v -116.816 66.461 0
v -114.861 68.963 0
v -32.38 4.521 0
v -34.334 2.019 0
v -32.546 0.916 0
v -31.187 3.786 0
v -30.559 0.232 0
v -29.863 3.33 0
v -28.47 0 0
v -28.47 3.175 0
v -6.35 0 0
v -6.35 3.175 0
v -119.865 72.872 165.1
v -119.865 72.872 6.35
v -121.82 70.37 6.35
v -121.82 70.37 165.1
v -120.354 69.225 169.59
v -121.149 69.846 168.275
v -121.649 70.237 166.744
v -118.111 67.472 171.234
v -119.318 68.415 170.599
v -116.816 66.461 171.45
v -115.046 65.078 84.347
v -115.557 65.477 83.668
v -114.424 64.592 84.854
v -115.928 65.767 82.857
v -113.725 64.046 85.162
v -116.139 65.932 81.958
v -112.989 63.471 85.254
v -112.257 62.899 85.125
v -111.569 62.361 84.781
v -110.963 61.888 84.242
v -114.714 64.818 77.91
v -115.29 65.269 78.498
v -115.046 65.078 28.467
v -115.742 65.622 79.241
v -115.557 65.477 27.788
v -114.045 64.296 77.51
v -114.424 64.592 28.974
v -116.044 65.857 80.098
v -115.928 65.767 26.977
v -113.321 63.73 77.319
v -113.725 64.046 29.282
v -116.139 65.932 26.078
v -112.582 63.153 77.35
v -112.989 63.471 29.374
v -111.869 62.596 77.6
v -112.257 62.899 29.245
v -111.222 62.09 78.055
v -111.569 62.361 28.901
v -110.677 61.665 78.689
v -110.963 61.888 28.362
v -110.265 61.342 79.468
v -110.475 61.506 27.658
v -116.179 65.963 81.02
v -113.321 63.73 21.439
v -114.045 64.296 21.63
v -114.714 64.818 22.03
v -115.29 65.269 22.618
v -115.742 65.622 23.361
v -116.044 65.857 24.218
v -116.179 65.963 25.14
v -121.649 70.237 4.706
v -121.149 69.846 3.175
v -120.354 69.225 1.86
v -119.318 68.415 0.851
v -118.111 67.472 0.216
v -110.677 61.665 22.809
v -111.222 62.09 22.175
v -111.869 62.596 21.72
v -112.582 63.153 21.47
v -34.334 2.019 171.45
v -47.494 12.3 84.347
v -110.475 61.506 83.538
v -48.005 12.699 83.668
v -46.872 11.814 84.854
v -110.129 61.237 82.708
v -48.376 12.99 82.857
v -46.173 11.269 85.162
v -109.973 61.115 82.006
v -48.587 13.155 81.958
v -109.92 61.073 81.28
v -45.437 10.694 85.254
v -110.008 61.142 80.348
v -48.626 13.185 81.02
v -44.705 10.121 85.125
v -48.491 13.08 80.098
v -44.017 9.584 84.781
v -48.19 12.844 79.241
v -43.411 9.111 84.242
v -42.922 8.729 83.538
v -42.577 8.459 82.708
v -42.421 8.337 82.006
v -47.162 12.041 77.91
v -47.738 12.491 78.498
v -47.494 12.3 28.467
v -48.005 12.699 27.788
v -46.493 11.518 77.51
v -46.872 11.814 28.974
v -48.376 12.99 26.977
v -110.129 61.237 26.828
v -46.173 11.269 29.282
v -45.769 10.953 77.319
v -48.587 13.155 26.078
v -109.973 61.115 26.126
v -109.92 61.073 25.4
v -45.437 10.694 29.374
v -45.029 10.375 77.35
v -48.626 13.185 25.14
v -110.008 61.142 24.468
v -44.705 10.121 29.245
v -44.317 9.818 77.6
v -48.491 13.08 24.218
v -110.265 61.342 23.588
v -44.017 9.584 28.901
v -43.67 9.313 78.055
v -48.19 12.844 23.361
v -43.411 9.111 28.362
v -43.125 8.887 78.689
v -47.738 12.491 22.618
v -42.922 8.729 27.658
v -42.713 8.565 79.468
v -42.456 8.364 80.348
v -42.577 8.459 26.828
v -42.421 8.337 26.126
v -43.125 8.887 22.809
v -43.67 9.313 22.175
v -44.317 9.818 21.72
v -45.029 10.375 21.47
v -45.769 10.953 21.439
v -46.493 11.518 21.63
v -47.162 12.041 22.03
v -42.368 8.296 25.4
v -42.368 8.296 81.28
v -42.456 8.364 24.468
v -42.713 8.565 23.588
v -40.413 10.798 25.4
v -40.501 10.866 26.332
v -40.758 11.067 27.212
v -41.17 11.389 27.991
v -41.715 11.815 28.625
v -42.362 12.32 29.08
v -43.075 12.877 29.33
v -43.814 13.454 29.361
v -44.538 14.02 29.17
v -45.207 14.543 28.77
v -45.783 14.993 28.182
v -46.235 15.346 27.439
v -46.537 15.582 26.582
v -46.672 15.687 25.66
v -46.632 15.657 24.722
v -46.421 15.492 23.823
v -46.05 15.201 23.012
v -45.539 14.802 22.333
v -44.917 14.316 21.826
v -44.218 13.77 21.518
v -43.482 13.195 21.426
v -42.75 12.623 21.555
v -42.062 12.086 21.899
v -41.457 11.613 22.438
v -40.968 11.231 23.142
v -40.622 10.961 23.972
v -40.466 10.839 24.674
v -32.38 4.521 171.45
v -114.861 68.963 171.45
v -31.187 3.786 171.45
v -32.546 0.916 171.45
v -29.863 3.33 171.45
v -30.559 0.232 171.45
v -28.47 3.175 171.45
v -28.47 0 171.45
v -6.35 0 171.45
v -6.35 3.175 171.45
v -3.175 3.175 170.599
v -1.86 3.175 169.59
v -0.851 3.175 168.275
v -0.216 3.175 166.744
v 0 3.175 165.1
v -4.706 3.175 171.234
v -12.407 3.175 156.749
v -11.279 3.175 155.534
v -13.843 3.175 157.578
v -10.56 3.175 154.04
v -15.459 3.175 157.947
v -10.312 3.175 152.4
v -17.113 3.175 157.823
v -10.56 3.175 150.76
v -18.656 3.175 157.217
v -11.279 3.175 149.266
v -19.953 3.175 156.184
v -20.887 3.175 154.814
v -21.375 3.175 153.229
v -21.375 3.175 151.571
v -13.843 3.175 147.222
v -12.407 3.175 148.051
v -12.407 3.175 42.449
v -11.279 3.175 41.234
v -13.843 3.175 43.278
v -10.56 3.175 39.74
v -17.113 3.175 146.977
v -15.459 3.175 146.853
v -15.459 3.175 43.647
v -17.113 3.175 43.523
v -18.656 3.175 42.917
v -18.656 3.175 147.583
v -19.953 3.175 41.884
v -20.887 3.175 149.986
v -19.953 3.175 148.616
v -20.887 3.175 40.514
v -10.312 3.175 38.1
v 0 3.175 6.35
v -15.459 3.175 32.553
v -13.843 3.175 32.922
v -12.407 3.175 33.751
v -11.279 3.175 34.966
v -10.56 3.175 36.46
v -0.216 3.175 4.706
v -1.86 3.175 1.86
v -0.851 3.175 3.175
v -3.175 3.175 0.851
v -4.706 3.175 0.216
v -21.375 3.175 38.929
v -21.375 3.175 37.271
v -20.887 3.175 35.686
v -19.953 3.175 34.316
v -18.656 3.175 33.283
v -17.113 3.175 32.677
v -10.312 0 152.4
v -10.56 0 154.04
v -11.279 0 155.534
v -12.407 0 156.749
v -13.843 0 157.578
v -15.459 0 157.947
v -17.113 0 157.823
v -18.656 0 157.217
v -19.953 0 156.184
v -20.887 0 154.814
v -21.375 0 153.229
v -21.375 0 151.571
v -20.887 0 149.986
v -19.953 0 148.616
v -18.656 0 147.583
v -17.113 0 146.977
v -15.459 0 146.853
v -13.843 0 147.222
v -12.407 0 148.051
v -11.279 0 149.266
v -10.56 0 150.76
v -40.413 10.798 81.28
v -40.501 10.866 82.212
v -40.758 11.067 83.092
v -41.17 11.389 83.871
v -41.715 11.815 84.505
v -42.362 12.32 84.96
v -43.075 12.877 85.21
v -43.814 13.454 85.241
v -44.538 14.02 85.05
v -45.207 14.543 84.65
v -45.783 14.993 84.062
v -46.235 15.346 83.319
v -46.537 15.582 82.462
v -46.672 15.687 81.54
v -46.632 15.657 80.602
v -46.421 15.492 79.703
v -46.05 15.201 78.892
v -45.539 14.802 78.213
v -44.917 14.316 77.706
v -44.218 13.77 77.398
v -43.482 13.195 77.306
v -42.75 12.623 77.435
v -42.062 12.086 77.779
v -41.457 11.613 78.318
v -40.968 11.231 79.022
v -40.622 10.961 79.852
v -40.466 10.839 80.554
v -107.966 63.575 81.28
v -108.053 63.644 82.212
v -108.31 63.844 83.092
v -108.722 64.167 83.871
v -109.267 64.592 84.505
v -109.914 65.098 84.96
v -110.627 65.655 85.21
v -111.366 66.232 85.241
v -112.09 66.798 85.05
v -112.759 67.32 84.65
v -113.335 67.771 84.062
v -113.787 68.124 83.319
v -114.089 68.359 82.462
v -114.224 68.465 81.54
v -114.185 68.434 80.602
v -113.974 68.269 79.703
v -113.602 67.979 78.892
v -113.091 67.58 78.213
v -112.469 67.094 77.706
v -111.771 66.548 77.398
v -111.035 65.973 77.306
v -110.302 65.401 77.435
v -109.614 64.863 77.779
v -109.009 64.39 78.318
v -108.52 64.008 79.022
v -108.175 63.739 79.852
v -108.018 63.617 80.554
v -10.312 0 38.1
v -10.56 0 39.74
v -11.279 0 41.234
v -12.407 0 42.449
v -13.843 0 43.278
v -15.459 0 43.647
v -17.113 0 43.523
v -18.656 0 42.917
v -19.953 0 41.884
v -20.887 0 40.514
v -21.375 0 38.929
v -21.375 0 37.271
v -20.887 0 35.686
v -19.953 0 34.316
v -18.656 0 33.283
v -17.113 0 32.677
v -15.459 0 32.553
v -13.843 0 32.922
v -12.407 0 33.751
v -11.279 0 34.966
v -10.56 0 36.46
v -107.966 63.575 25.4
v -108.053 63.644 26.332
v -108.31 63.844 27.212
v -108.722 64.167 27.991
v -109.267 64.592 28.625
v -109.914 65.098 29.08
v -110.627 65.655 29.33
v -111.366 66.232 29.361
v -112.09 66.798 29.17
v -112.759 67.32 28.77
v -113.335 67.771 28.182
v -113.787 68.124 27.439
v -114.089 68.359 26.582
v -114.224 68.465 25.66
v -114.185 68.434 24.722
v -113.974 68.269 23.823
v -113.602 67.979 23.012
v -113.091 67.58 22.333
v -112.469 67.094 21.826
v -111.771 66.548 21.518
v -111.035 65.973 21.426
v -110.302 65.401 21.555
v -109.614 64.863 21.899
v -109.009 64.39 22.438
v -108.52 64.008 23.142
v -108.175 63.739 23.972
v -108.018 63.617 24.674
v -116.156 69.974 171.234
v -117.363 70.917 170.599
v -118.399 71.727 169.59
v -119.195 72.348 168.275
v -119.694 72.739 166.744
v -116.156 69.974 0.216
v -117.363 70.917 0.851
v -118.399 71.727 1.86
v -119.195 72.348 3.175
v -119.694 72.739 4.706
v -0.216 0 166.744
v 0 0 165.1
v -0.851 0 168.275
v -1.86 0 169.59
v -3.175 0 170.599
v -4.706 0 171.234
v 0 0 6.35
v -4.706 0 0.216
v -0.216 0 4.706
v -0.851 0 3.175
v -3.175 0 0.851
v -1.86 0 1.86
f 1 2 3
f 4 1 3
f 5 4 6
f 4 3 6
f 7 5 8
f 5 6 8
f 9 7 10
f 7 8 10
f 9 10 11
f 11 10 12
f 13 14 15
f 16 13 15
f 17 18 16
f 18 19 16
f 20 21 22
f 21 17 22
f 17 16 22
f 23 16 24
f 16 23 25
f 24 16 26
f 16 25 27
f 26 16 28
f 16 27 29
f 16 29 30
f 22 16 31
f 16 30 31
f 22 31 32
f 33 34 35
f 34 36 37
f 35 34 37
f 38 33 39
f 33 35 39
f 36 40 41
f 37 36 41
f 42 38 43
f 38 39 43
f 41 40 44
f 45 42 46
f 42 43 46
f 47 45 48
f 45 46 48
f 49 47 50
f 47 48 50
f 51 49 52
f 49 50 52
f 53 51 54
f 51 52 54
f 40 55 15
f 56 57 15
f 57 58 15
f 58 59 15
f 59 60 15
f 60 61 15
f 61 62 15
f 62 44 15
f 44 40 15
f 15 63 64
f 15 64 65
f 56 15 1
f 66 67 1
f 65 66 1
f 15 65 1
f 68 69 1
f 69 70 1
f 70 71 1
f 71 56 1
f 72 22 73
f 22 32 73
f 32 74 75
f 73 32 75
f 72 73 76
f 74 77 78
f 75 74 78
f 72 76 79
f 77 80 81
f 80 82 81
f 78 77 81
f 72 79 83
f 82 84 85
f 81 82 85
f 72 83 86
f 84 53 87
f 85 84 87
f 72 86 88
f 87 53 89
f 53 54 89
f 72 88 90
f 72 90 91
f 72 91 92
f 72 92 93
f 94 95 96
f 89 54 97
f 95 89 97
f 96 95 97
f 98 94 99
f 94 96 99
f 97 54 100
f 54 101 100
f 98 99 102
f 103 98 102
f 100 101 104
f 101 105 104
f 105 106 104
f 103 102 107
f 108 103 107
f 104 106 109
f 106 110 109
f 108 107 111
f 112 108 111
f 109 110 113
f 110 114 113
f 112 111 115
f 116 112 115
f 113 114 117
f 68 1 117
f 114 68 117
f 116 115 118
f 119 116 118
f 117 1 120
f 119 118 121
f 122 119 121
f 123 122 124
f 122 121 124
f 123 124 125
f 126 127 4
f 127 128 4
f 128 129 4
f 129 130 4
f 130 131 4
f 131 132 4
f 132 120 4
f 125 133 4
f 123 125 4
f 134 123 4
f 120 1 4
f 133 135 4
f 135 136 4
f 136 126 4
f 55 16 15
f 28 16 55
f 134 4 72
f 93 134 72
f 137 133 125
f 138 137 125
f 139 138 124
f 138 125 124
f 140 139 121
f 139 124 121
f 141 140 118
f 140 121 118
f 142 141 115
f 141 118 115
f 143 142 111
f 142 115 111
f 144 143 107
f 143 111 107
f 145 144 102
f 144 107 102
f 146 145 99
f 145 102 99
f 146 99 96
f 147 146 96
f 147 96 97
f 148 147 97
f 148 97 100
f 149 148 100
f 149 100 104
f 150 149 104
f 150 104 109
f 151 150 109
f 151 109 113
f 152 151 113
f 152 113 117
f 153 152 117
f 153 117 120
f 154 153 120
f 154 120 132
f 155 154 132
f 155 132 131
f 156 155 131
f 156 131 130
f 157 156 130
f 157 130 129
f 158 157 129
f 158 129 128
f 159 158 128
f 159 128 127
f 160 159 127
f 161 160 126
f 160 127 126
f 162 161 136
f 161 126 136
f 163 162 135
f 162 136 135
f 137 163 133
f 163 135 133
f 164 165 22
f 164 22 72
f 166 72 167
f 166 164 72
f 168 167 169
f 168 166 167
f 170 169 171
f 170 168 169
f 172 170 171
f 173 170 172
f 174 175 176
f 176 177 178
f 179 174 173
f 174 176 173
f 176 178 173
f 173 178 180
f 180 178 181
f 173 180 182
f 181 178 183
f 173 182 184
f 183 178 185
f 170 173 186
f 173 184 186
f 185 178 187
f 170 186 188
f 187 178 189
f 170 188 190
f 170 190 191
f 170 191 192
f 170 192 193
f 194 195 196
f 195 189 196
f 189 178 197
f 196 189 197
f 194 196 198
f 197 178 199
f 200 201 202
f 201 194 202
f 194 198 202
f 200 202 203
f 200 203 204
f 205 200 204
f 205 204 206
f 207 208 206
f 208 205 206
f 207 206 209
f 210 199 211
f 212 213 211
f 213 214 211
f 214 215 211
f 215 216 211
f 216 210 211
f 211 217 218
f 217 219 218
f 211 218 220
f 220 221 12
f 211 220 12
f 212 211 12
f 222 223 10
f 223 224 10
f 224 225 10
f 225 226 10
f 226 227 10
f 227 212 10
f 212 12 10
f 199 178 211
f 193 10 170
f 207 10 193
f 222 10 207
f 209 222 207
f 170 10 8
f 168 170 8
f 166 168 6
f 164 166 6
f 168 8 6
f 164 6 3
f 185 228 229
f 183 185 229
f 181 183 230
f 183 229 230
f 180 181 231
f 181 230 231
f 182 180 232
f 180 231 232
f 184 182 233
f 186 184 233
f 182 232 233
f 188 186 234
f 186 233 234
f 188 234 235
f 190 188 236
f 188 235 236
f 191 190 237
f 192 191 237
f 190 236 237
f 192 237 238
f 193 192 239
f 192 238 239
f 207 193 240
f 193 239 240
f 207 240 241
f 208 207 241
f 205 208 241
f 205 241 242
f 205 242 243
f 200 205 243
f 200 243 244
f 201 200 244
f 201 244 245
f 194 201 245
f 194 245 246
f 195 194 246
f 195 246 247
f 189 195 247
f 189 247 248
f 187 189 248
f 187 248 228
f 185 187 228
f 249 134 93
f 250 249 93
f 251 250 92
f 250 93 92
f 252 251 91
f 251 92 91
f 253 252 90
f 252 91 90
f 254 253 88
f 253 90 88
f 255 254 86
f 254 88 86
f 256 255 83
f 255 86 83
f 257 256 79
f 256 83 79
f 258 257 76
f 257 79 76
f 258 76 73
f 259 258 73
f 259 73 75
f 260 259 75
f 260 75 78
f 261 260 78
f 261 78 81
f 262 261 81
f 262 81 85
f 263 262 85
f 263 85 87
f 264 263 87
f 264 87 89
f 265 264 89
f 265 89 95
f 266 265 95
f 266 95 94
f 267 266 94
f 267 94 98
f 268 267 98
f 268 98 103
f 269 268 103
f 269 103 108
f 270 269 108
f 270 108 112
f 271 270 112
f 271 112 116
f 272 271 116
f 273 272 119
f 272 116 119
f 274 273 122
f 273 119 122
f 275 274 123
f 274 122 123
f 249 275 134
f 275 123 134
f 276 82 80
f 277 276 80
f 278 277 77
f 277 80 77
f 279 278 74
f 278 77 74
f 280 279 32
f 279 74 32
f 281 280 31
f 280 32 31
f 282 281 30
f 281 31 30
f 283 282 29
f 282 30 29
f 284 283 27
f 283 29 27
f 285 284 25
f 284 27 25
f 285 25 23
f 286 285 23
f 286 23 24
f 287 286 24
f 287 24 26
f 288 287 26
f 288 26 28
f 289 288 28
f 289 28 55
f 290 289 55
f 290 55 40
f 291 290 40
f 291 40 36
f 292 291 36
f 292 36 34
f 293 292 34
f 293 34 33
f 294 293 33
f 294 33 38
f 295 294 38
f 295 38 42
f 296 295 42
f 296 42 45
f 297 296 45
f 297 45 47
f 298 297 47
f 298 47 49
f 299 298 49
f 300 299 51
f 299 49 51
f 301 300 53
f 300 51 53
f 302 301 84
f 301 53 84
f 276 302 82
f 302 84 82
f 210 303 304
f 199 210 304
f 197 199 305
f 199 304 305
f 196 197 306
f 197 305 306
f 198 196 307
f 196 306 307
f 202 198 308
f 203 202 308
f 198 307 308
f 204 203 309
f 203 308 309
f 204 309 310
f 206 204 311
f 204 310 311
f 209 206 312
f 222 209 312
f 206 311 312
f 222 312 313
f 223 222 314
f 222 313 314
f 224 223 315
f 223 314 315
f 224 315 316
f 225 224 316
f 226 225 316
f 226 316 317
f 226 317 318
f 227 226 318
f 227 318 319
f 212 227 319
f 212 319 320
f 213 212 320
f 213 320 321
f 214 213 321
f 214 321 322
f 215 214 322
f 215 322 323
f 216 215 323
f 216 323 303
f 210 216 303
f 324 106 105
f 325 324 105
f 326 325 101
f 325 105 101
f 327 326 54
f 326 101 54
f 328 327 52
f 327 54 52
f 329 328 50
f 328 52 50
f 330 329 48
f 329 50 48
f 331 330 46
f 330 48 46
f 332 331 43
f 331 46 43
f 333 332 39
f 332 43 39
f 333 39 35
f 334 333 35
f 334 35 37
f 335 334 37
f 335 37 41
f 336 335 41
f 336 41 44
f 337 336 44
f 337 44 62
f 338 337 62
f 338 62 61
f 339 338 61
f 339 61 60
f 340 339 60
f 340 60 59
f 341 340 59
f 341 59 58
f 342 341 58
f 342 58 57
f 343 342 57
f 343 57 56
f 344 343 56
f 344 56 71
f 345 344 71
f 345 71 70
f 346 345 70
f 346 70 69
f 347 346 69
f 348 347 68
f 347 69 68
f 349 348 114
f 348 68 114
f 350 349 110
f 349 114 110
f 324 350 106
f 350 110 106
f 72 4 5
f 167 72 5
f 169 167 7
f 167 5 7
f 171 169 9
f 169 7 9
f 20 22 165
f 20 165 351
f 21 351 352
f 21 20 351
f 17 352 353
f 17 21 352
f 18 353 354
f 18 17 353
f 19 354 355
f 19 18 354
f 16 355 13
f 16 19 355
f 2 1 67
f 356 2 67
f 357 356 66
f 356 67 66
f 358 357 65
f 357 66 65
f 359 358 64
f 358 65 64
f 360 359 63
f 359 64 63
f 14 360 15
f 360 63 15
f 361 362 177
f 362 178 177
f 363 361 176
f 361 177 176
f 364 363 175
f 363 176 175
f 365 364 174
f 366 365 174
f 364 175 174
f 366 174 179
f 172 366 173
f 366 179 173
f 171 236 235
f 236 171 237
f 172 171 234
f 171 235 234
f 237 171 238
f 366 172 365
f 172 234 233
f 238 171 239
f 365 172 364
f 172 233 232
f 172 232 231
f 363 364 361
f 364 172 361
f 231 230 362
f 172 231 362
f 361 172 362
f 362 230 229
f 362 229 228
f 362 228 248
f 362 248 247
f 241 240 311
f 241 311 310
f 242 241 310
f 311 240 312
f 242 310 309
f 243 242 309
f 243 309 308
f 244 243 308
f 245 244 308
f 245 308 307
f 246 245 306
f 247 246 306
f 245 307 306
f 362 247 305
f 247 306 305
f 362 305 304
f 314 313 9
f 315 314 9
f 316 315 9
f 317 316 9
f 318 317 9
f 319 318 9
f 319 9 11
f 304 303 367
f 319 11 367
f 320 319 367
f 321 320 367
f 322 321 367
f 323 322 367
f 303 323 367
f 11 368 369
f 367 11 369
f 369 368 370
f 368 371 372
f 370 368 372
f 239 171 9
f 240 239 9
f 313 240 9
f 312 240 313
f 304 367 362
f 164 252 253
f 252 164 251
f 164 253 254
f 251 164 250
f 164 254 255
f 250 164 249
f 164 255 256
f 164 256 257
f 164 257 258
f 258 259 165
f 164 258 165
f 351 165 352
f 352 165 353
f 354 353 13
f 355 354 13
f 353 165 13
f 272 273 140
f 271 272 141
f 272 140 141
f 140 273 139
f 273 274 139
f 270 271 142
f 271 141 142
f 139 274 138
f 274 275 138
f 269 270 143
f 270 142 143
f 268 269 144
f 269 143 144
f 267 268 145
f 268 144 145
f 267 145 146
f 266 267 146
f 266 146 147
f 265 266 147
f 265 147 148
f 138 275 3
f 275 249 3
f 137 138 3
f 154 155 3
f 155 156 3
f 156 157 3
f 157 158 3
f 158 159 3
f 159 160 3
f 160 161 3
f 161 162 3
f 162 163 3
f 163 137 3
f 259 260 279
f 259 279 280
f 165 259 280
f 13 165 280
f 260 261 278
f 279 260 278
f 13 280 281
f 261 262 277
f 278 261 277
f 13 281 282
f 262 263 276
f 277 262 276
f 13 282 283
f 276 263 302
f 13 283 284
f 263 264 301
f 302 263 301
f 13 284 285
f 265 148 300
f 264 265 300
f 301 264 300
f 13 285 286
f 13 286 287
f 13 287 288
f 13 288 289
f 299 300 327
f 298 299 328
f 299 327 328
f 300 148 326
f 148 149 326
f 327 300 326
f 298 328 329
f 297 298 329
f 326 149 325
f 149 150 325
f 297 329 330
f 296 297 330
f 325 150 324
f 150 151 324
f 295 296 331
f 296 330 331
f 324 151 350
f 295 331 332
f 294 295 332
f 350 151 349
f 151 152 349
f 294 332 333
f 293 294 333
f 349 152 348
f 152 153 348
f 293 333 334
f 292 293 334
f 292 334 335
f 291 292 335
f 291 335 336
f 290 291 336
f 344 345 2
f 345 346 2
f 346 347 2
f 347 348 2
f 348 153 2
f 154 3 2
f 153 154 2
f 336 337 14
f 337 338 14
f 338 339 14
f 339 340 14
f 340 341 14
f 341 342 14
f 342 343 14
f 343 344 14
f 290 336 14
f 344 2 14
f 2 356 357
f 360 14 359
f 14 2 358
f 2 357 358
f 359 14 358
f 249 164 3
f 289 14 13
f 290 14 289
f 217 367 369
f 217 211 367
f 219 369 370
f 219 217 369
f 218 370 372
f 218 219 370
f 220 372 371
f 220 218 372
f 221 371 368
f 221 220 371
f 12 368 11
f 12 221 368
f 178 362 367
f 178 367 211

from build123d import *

# Parameters (mm, degrees)
F1_DEPTH = 171.45
F2_R     = 5.5626
F3_DEPTH = 72.873041
F4_R     = 3.9751
F5_DEPTH = 76.972204
F6_R     = 6.35


with BuildPart() as f1:
    # F0 (on Top) → F1 (new body)
    with BuildSketch(Plane.XY):
        with BuildLine():
            Line((0, 0), (0, 3.175))
            Line((0, 3.175), (-28.470279, 3.175))
            ThreePointArc((-28.470279, 3.175), (-30.537637, 3.520957), (-32.37973, 4.521132))
            Line((-32.37973, 4.521132), (-119.864904, 72.872041))
            Line((-119.864904, 72.872041), (-121.819629, 70.370107))
            Line((-121.819629, 70.370107), (-34.334455, 2.019198))
            ThreePointArc((-34.334455, 2.019198), (-31.571316, 0.518936), (-28.470279, 0))
            Line((-28.470279, 0), (0, 0))
        make_face()
    extrude(amount=F1_DEPTH)

    # F2 (on face) → F3 (cut, through all)
    with BuildSketch(Plane.XZ):
        with Locations((-15.875, 152.4)):
            Circle(F2_R)
        with Locations((-15.875, 38.1)):
            Circle(F2_R)
    extrude(amount=-F3_DEPTH, mode=Mode.SUBTRACT)

    # F4 (on face) → F5 (cut, through all)
    with BuildSketch(Plane(origin=(-12.03449, -15.403445, 0), x_dir=(0.788011, -0.615661, 0), z_dir=(-0.615661, -0.788011, 0))):
        with Locations((-128.194141, 81.28)):
            Circle(F4_R)
        with Locations((-42.469141, 81.28)):
            Circle(F4_R)
        with Locations((-42.469141, 25.4)):
            Circle(F4_R)
        with Locations((-128.194141, 25.4)):
            Circle(F4_R)
    extrude(amount=-F5_DEPTH, mode=Mode.SUBTRACT)

    # F6
    f6_edges = [f1.edges().sort_by_distance(p)[0] for p in [
        (-120.842267, 71.621074, 171.45),
        (-120.842267, 71.621074, 0),
        (0, 1.5875, 171.45),
        (0, 1.5875, 0),
    ]]
    fillet(f6_edges, radius=F6_R)


solid = f1.part
